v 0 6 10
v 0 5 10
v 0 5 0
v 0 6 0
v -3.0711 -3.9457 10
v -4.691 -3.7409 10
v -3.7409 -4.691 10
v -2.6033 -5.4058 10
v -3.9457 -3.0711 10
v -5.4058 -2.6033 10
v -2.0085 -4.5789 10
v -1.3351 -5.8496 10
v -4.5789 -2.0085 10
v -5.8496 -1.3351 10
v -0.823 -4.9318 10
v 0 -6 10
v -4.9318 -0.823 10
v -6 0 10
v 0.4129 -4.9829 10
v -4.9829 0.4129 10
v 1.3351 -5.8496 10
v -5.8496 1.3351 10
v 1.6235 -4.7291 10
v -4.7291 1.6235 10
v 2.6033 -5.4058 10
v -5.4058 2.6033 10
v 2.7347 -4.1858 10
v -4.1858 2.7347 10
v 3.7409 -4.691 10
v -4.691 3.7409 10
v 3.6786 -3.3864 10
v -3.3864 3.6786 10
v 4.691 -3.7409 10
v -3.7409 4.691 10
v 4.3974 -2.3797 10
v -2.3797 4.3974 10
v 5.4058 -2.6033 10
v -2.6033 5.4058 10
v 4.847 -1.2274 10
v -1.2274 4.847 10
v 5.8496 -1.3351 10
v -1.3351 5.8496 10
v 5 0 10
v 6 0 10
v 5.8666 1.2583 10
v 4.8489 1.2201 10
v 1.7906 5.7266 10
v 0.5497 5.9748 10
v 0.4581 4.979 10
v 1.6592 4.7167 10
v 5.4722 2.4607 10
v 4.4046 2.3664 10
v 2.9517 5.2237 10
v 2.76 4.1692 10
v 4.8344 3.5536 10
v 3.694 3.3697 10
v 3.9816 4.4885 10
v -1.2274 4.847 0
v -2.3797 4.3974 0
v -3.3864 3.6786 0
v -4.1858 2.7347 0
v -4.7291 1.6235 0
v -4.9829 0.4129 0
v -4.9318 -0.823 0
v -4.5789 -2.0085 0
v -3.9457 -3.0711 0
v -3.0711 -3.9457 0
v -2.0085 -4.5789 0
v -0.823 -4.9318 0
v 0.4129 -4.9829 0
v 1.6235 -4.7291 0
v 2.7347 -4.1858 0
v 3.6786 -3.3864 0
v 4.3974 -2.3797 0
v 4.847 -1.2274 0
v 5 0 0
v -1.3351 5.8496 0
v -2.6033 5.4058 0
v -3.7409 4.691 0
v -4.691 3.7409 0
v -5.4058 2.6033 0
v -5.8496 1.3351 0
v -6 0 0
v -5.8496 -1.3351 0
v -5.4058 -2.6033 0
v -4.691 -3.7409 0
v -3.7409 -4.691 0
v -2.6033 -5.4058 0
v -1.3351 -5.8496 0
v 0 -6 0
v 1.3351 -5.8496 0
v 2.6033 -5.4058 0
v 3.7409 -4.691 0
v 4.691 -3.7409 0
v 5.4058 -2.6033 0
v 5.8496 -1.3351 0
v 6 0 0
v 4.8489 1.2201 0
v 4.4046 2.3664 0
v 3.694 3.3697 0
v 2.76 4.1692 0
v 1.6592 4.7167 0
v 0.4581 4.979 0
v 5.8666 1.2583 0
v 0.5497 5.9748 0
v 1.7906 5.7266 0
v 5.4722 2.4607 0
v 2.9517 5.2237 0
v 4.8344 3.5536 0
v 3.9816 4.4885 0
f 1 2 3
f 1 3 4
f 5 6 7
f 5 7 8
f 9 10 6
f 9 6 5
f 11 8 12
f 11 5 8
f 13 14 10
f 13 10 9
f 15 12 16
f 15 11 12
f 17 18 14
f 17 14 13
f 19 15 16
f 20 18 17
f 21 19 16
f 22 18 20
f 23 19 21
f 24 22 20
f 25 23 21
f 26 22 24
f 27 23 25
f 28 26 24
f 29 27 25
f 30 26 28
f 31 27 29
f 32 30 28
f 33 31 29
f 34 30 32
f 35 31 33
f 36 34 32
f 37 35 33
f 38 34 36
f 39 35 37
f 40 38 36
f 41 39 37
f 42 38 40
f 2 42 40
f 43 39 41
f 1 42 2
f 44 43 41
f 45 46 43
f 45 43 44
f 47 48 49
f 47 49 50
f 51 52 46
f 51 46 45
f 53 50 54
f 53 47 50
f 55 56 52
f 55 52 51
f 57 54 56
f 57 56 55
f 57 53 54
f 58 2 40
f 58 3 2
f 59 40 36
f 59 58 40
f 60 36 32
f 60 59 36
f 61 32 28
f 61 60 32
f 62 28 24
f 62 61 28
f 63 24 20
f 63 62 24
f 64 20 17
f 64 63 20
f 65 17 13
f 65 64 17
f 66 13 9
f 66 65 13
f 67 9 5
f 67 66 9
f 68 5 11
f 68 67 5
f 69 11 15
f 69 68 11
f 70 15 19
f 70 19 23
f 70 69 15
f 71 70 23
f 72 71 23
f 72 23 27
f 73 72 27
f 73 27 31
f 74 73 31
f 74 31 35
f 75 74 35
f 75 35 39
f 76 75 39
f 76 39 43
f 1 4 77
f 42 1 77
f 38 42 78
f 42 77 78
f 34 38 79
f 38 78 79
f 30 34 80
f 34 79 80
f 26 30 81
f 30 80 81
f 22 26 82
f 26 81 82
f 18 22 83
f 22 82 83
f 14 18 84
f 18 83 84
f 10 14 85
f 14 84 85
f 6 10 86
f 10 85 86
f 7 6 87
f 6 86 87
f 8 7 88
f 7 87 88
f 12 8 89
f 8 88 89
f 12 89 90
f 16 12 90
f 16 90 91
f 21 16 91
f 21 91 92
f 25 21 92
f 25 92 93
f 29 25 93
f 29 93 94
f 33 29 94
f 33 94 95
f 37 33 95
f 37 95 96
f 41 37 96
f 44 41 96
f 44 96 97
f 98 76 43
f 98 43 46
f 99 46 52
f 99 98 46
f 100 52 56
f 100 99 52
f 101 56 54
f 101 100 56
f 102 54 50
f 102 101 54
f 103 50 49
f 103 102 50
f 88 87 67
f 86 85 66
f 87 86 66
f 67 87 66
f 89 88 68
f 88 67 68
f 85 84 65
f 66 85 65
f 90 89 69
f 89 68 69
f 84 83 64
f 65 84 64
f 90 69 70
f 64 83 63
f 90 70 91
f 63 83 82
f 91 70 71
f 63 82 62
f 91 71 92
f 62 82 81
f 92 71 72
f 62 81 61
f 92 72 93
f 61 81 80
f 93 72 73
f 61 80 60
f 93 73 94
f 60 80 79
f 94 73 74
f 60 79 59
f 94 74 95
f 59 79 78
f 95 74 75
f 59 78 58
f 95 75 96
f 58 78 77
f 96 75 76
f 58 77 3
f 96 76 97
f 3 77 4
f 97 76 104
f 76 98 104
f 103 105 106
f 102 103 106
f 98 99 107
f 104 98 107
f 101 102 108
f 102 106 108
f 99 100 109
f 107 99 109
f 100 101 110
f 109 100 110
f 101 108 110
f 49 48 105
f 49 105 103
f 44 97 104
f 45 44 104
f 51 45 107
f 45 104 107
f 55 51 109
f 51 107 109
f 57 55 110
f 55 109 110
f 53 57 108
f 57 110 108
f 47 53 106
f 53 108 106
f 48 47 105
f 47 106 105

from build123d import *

# Parameters (mm, degrees)
SKETCH_1_R          = 6
SKETCH_1_R_2        = 5
EXTRUDE_1_DEPTH     = 10
CUT_EXTRUDE_1_DEPTH = 20


with BuildPart() as part:
    # 草图1 → 凸台-拉伸1 (new body)
    with BuildSketch(Plane.XY):
        Circle(SKETCH_1_R)
        Circle(SKETCH_1_R_2, mode=Mode.SUBTRACT)
    extrude(amount=EXTRUDE_1_DEPTH)

    # 草图2 → 切除-拉伸1 (cut)
    with BuildSketch(Plane.XY.offset(10)):
        Polygon((0, 0), (0, 6), (0.587596227, 6.386088304), align=None)
    extrude(amount=-CUT_EXTRUDE_1_DEPTH, mode=Mode.SUBTRACT)


solid = part.part
